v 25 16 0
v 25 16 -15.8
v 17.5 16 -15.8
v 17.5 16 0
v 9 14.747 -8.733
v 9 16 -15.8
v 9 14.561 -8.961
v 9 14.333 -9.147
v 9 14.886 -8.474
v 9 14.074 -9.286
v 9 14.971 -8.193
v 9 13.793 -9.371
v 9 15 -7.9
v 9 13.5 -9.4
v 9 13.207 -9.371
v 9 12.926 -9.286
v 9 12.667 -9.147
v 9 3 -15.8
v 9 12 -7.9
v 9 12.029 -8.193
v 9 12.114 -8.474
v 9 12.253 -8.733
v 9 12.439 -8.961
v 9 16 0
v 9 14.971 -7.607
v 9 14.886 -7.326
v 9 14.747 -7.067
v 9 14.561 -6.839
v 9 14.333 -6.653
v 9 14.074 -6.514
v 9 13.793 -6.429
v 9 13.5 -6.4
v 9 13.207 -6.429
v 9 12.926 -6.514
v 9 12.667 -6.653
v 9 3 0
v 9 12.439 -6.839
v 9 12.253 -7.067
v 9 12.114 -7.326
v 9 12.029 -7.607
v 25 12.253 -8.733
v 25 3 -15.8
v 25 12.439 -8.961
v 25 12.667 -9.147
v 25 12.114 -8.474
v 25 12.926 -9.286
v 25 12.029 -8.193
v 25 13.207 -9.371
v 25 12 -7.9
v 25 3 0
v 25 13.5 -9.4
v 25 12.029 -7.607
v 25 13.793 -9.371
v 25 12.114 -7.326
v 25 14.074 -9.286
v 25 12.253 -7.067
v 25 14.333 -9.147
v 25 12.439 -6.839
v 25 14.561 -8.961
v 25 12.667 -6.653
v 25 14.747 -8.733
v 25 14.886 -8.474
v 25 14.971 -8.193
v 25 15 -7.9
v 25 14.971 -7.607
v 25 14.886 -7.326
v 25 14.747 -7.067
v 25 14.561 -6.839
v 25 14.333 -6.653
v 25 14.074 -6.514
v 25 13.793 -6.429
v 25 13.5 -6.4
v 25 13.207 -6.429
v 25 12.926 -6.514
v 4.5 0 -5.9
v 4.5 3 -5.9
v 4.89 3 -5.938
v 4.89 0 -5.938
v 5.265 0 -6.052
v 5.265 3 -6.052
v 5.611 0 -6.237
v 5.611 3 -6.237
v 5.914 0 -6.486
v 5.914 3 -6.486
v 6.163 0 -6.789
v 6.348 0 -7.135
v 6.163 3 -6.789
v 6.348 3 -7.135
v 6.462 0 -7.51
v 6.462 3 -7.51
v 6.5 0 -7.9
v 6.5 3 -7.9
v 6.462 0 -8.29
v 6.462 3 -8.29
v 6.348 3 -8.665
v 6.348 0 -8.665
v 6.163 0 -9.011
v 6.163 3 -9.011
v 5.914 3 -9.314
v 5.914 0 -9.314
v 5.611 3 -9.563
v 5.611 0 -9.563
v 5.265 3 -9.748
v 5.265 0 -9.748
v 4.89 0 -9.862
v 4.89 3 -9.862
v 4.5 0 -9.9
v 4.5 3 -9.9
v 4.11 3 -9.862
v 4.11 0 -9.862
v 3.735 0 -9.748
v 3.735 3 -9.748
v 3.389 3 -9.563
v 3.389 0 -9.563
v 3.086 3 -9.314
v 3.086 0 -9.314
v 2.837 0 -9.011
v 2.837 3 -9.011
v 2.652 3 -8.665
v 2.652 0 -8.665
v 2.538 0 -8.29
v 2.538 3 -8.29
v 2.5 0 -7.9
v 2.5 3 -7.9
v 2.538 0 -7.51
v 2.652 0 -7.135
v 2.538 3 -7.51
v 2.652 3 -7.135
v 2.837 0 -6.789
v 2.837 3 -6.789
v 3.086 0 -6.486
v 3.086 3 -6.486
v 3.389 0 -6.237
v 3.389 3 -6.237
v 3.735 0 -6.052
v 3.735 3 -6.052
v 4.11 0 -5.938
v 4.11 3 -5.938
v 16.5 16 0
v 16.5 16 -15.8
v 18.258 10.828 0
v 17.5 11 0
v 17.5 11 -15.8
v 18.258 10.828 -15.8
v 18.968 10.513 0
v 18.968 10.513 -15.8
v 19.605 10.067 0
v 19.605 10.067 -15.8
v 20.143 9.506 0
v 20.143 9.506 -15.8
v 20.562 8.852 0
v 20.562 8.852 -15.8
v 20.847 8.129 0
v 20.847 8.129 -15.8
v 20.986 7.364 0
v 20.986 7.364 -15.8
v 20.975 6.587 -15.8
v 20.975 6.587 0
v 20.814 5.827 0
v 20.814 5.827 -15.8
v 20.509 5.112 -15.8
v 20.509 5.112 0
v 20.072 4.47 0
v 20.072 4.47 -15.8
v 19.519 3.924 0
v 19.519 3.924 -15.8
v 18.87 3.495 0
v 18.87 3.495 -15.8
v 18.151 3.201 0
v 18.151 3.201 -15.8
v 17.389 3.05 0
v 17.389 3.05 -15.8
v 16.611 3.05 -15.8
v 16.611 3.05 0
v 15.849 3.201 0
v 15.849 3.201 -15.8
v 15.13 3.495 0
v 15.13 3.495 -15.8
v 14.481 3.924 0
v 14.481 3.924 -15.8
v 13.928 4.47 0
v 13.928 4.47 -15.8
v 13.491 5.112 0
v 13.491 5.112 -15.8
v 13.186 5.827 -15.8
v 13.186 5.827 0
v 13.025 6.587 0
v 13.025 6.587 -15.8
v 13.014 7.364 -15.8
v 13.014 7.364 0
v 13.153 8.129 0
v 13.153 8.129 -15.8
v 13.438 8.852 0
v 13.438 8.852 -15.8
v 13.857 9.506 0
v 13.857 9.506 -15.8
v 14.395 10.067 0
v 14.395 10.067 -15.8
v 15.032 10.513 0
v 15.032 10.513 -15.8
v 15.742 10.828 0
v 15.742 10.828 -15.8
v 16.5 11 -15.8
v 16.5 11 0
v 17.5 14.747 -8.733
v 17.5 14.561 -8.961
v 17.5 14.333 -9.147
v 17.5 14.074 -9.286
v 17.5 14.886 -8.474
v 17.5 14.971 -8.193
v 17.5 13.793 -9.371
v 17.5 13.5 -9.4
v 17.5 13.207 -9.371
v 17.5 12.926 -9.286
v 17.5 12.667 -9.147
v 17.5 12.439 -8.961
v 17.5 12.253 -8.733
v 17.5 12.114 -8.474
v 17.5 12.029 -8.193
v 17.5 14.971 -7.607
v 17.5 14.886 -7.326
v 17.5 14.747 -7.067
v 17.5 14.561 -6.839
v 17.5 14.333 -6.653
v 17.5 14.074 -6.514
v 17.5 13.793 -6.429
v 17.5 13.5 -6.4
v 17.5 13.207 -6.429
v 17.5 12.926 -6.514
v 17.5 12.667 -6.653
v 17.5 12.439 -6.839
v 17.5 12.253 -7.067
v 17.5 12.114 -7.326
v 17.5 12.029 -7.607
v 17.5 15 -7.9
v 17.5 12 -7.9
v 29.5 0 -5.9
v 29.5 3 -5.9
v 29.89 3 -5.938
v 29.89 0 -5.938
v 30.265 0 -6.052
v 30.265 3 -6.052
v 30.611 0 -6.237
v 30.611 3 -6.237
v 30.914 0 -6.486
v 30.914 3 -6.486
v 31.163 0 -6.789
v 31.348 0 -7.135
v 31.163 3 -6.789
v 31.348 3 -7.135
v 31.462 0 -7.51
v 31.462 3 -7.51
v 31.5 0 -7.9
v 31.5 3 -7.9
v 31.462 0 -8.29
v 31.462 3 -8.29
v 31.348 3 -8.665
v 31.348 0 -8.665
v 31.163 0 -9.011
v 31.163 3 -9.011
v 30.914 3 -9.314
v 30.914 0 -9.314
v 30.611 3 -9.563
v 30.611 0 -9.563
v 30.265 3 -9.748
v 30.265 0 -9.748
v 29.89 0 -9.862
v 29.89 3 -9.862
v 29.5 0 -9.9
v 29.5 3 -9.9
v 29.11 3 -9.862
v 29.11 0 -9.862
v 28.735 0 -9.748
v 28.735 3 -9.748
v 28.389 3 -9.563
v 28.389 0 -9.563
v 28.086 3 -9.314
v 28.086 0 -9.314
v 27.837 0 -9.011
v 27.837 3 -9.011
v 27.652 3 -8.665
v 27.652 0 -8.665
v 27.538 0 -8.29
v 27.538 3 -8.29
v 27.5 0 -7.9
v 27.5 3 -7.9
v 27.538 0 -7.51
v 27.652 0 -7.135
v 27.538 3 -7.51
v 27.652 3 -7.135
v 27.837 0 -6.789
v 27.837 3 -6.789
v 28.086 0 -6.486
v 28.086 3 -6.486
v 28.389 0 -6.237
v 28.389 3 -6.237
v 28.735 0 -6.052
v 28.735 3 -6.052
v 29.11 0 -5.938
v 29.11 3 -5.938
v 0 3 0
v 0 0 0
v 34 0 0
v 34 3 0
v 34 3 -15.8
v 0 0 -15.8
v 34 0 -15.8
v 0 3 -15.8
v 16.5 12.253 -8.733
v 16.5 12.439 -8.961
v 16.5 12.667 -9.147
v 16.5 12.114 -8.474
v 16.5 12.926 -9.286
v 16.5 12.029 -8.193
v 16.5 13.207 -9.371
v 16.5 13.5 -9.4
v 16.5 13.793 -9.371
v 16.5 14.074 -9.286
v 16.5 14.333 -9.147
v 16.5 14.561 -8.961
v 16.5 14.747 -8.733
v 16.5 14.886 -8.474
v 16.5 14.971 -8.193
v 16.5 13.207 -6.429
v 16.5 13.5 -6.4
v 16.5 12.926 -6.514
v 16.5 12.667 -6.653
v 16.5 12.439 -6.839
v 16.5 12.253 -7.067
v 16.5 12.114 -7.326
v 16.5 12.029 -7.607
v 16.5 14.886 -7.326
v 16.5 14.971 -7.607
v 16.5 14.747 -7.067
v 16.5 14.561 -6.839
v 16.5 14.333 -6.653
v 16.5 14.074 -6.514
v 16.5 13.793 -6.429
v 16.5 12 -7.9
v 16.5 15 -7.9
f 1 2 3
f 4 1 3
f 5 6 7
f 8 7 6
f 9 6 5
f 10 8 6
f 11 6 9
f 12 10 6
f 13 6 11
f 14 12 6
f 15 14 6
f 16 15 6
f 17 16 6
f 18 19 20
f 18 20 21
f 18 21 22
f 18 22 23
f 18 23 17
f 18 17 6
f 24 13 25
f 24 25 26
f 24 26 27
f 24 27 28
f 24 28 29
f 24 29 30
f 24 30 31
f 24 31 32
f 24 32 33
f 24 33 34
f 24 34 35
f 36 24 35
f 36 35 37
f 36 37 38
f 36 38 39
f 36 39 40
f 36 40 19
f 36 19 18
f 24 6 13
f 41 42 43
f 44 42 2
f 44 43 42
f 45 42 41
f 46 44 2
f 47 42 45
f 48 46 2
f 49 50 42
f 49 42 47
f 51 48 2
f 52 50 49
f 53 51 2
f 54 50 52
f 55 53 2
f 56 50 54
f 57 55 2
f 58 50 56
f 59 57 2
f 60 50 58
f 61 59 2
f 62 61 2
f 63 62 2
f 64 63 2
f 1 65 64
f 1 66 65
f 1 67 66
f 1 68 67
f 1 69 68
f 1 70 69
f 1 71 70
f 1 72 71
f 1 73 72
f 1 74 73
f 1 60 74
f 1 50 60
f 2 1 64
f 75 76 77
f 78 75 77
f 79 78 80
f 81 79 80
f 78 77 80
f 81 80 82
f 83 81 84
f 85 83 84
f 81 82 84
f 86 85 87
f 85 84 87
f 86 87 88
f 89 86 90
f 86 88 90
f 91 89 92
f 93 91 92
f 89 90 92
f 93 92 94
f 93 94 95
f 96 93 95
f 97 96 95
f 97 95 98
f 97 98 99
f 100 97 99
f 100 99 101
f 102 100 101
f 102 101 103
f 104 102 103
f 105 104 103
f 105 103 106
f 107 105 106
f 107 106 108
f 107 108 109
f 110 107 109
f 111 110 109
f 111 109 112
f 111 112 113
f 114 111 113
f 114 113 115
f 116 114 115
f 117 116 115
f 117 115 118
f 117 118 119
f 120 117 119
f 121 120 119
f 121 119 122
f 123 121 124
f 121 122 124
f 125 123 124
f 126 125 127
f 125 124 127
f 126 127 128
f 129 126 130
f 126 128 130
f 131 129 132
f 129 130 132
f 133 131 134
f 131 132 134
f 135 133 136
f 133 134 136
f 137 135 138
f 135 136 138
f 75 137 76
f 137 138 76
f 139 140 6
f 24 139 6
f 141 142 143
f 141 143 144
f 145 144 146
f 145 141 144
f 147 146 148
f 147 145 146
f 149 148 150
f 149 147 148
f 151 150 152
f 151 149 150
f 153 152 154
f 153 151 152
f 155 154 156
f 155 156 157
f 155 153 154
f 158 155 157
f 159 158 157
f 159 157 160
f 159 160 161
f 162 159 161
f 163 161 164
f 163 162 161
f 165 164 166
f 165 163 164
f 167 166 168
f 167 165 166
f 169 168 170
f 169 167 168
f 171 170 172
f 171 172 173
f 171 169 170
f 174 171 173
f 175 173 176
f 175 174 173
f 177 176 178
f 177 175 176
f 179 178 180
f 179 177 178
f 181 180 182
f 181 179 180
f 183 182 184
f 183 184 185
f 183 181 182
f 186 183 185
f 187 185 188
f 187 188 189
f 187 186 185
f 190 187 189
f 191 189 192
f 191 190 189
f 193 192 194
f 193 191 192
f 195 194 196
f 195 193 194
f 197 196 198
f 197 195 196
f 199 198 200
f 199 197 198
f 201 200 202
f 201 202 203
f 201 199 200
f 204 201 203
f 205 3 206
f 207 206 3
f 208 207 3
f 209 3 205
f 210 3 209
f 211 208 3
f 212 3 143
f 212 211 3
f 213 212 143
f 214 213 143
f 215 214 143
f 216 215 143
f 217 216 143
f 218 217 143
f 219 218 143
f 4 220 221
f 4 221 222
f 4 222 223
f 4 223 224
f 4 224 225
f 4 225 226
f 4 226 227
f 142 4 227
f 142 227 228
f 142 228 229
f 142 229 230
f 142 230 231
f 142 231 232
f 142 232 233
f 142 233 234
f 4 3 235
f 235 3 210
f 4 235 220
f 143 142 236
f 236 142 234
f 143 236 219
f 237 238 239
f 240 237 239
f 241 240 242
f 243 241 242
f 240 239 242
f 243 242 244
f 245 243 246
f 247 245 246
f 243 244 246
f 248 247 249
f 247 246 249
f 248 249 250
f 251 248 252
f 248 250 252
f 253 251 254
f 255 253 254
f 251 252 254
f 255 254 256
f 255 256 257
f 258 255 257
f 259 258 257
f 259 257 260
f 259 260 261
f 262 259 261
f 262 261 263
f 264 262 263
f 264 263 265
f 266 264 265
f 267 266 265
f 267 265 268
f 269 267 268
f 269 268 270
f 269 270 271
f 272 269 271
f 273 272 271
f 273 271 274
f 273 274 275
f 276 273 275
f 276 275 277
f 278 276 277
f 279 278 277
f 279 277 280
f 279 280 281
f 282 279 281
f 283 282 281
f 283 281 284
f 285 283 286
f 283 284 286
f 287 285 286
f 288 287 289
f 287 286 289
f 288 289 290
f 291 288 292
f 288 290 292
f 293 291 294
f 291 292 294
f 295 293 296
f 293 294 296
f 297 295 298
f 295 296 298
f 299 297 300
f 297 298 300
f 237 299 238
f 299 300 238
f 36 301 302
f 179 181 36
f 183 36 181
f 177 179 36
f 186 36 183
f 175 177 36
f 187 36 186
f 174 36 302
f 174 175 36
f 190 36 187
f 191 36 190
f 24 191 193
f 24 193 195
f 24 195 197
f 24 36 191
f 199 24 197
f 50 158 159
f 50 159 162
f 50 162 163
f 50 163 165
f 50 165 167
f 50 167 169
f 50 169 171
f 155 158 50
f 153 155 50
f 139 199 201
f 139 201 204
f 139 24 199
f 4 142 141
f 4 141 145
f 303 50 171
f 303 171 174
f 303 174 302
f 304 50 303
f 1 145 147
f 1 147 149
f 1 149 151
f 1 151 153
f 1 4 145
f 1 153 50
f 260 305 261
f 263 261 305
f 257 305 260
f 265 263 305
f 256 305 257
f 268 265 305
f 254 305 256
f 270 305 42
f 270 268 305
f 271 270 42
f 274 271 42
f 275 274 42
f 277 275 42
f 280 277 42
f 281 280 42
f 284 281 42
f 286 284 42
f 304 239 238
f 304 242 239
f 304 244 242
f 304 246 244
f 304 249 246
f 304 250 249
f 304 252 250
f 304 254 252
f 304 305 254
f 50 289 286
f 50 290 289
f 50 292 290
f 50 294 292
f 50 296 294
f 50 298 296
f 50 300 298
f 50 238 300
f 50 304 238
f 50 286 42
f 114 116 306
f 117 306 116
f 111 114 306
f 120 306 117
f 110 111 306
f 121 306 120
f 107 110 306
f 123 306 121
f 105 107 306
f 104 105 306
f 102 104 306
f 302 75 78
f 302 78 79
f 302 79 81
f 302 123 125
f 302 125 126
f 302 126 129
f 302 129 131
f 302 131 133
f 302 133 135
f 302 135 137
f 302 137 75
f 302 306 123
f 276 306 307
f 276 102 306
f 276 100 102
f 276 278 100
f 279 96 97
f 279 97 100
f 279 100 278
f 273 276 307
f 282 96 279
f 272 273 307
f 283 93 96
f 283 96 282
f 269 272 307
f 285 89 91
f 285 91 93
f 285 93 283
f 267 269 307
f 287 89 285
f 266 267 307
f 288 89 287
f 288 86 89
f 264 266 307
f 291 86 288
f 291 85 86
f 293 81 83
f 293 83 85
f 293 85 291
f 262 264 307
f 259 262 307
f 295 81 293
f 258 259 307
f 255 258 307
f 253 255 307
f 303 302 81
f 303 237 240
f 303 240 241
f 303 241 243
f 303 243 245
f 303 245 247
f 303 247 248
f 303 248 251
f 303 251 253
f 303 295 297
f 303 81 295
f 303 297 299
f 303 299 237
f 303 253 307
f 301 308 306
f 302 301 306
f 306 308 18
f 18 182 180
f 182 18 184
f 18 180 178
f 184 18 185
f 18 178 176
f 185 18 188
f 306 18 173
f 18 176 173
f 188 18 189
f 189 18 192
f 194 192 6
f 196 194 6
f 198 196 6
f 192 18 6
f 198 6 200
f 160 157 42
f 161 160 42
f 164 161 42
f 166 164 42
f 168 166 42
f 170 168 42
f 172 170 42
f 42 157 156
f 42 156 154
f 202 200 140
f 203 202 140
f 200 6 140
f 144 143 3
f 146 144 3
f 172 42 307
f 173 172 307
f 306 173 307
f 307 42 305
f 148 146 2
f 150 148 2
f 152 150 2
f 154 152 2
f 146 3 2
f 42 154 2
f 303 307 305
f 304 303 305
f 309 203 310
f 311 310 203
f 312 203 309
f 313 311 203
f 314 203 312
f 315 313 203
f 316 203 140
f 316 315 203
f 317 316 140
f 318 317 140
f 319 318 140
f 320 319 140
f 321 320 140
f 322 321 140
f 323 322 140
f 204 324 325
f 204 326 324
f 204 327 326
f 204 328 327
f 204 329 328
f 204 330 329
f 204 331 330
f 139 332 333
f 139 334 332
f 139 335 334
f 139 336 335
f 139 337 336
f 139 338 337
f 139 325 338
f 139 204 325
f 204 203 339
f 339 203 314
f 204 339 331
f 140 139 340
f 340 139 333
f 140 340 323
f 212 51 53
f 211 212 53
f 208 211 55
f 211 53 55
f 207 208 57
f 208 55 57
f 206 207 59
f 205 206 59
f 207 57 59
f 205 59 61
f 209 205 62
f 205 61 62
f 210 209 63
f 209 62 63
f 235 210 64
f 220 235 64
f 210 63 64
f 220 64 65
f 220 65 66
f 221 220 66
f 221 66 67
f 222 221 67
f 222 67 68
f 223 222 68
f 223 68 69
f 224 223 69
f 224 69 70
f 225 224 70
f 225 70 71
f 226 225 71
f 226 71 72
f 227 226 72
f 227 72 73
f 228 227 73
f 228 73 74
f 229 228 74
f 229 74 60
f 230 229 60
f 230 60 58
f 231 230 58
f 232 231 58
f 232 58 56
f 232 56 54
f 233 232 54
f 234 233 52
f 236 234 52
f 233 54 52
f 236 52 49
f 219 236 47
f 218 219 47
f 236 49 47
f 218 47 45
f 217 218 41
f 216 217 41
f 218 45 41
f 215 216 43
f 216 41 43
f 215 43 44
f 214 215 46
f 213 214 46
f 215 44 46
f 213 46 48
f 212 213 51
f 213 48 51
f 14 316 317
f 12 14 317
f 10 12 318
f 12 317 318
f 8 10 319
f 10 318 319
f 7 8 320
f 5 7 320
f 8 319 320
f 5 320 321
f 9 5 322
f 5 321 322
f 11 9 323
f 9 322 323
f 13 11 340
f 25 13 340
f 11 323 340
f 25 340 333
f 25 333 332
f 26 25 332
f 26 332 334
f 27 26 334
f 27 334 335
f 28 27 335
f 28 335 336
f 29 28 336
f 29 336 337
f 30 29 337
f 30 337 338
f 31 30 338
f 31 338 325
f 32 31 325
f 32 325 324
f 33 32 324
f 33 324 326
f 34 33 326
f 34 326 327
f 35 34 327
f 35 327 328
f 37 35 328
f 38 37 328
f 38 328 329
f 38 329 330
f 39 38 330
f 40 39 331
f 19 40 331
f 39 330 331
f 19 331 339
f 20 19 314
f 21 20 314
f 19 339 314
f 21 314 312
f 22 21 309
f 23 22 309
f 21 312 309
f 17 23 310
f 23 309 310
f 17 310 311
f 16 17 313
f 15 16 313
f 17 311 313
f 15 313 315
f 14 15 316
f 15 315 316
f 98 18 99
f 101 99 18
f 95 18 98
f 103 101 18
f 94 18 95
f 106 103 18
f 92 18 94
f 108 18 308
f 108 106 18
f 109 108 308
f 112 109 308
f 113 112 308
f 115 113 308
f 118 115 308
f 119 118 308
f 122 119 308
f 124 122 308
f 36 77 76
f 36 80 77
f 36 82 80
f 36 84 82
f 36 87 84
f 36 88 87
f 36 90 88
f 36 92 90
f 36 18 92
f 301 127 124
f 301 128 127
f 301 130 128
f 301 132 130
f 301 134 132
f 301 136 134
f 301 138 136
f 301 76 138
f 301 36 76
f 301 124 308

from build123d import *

# Parameters (mm, degrees)
BOSS_EXTRUDE1_DEPTH = 15.8
SKETCH2_R           = 2
CUT_EXTRUDE1_DEPTH  = 15.8
SKETCH4_R           = 2
CUT_EXTRUDE2_DEPTH  = 15.8
SKETCH5_R           = 1.5
CUT_EXTRUDE3_DEPTH  = 34.624990706


with BuildPart() as part:
    # Sketch1 → Boss-Extrude1 (new body)
    with BuildSketch(Plane.XY):
        with BuildLine():
            Line((0, 0), (34, 0))
            Line((34, 0), (34, 3))
            Line((34, 3), (25, 3))
            Line((25, 3), (25, 16))
            Line((25, 16), (17.5, 16))
            Line((17.5, 16), (17.5, 11))
            ThreePointArc((17.5, 11), (17, 3.031373033), (16.5, 11))
            Line((16.5, 11), (16.5, 16))
            Line((16.5, 16), (9, 16))
            Line((9, 16), (9, 3))
            Line((9, 3), (0, 3))
            Line((0, 3), (0, 0))
        make_face()
    extrude(amount=-BOSS_EXTRUDE1_DEPTH)

    # Sketch2 → Cut-Extrude1 (cut)
    with BuildSketch(Plane(origin=(0, 3, 0), x_dir=(1, 0, 0), z_dir=(0, 1, 0))):
        with Locations(Location((4.5, 7.9, 0), (0, 0, 270))):
            Circle(SKETCH2_R)
    extrude(amount=-CUT_EXTRUDE1_DEPTH, mode=Mode.SUBTRACT)

    # Sketch4 → Cut-Extrude2 (cut)
    with BuildSketch(Plane(origin=(0, 3, 0), x_dir=(1, 0, 0), z_dir=(0, 1, 0))):
        with Locations(Location((29.5, 7.9, 0), (0, 0, 270))):
            Circle(SKETCH4_R)
    extrude(amount=-CUT_EXTRUDE2_DEPTH, mode=Mode.SUBTRACT)

    # Sketch5 → Cut-Extrude3 (cut, through all)
    with BuildSketch(Plane(origin=(25, 0, 0), x_dir=(0, 0, -1), z_dir=(1, 0, 0))):
        with Locations((7.9, 13.5)):
            Circle(SKETCH5_R)
    extrude(amount=-CUT_EXTRUDE3_DEPTH, mode=Mode.SUBTRACT)


solid = part.part
